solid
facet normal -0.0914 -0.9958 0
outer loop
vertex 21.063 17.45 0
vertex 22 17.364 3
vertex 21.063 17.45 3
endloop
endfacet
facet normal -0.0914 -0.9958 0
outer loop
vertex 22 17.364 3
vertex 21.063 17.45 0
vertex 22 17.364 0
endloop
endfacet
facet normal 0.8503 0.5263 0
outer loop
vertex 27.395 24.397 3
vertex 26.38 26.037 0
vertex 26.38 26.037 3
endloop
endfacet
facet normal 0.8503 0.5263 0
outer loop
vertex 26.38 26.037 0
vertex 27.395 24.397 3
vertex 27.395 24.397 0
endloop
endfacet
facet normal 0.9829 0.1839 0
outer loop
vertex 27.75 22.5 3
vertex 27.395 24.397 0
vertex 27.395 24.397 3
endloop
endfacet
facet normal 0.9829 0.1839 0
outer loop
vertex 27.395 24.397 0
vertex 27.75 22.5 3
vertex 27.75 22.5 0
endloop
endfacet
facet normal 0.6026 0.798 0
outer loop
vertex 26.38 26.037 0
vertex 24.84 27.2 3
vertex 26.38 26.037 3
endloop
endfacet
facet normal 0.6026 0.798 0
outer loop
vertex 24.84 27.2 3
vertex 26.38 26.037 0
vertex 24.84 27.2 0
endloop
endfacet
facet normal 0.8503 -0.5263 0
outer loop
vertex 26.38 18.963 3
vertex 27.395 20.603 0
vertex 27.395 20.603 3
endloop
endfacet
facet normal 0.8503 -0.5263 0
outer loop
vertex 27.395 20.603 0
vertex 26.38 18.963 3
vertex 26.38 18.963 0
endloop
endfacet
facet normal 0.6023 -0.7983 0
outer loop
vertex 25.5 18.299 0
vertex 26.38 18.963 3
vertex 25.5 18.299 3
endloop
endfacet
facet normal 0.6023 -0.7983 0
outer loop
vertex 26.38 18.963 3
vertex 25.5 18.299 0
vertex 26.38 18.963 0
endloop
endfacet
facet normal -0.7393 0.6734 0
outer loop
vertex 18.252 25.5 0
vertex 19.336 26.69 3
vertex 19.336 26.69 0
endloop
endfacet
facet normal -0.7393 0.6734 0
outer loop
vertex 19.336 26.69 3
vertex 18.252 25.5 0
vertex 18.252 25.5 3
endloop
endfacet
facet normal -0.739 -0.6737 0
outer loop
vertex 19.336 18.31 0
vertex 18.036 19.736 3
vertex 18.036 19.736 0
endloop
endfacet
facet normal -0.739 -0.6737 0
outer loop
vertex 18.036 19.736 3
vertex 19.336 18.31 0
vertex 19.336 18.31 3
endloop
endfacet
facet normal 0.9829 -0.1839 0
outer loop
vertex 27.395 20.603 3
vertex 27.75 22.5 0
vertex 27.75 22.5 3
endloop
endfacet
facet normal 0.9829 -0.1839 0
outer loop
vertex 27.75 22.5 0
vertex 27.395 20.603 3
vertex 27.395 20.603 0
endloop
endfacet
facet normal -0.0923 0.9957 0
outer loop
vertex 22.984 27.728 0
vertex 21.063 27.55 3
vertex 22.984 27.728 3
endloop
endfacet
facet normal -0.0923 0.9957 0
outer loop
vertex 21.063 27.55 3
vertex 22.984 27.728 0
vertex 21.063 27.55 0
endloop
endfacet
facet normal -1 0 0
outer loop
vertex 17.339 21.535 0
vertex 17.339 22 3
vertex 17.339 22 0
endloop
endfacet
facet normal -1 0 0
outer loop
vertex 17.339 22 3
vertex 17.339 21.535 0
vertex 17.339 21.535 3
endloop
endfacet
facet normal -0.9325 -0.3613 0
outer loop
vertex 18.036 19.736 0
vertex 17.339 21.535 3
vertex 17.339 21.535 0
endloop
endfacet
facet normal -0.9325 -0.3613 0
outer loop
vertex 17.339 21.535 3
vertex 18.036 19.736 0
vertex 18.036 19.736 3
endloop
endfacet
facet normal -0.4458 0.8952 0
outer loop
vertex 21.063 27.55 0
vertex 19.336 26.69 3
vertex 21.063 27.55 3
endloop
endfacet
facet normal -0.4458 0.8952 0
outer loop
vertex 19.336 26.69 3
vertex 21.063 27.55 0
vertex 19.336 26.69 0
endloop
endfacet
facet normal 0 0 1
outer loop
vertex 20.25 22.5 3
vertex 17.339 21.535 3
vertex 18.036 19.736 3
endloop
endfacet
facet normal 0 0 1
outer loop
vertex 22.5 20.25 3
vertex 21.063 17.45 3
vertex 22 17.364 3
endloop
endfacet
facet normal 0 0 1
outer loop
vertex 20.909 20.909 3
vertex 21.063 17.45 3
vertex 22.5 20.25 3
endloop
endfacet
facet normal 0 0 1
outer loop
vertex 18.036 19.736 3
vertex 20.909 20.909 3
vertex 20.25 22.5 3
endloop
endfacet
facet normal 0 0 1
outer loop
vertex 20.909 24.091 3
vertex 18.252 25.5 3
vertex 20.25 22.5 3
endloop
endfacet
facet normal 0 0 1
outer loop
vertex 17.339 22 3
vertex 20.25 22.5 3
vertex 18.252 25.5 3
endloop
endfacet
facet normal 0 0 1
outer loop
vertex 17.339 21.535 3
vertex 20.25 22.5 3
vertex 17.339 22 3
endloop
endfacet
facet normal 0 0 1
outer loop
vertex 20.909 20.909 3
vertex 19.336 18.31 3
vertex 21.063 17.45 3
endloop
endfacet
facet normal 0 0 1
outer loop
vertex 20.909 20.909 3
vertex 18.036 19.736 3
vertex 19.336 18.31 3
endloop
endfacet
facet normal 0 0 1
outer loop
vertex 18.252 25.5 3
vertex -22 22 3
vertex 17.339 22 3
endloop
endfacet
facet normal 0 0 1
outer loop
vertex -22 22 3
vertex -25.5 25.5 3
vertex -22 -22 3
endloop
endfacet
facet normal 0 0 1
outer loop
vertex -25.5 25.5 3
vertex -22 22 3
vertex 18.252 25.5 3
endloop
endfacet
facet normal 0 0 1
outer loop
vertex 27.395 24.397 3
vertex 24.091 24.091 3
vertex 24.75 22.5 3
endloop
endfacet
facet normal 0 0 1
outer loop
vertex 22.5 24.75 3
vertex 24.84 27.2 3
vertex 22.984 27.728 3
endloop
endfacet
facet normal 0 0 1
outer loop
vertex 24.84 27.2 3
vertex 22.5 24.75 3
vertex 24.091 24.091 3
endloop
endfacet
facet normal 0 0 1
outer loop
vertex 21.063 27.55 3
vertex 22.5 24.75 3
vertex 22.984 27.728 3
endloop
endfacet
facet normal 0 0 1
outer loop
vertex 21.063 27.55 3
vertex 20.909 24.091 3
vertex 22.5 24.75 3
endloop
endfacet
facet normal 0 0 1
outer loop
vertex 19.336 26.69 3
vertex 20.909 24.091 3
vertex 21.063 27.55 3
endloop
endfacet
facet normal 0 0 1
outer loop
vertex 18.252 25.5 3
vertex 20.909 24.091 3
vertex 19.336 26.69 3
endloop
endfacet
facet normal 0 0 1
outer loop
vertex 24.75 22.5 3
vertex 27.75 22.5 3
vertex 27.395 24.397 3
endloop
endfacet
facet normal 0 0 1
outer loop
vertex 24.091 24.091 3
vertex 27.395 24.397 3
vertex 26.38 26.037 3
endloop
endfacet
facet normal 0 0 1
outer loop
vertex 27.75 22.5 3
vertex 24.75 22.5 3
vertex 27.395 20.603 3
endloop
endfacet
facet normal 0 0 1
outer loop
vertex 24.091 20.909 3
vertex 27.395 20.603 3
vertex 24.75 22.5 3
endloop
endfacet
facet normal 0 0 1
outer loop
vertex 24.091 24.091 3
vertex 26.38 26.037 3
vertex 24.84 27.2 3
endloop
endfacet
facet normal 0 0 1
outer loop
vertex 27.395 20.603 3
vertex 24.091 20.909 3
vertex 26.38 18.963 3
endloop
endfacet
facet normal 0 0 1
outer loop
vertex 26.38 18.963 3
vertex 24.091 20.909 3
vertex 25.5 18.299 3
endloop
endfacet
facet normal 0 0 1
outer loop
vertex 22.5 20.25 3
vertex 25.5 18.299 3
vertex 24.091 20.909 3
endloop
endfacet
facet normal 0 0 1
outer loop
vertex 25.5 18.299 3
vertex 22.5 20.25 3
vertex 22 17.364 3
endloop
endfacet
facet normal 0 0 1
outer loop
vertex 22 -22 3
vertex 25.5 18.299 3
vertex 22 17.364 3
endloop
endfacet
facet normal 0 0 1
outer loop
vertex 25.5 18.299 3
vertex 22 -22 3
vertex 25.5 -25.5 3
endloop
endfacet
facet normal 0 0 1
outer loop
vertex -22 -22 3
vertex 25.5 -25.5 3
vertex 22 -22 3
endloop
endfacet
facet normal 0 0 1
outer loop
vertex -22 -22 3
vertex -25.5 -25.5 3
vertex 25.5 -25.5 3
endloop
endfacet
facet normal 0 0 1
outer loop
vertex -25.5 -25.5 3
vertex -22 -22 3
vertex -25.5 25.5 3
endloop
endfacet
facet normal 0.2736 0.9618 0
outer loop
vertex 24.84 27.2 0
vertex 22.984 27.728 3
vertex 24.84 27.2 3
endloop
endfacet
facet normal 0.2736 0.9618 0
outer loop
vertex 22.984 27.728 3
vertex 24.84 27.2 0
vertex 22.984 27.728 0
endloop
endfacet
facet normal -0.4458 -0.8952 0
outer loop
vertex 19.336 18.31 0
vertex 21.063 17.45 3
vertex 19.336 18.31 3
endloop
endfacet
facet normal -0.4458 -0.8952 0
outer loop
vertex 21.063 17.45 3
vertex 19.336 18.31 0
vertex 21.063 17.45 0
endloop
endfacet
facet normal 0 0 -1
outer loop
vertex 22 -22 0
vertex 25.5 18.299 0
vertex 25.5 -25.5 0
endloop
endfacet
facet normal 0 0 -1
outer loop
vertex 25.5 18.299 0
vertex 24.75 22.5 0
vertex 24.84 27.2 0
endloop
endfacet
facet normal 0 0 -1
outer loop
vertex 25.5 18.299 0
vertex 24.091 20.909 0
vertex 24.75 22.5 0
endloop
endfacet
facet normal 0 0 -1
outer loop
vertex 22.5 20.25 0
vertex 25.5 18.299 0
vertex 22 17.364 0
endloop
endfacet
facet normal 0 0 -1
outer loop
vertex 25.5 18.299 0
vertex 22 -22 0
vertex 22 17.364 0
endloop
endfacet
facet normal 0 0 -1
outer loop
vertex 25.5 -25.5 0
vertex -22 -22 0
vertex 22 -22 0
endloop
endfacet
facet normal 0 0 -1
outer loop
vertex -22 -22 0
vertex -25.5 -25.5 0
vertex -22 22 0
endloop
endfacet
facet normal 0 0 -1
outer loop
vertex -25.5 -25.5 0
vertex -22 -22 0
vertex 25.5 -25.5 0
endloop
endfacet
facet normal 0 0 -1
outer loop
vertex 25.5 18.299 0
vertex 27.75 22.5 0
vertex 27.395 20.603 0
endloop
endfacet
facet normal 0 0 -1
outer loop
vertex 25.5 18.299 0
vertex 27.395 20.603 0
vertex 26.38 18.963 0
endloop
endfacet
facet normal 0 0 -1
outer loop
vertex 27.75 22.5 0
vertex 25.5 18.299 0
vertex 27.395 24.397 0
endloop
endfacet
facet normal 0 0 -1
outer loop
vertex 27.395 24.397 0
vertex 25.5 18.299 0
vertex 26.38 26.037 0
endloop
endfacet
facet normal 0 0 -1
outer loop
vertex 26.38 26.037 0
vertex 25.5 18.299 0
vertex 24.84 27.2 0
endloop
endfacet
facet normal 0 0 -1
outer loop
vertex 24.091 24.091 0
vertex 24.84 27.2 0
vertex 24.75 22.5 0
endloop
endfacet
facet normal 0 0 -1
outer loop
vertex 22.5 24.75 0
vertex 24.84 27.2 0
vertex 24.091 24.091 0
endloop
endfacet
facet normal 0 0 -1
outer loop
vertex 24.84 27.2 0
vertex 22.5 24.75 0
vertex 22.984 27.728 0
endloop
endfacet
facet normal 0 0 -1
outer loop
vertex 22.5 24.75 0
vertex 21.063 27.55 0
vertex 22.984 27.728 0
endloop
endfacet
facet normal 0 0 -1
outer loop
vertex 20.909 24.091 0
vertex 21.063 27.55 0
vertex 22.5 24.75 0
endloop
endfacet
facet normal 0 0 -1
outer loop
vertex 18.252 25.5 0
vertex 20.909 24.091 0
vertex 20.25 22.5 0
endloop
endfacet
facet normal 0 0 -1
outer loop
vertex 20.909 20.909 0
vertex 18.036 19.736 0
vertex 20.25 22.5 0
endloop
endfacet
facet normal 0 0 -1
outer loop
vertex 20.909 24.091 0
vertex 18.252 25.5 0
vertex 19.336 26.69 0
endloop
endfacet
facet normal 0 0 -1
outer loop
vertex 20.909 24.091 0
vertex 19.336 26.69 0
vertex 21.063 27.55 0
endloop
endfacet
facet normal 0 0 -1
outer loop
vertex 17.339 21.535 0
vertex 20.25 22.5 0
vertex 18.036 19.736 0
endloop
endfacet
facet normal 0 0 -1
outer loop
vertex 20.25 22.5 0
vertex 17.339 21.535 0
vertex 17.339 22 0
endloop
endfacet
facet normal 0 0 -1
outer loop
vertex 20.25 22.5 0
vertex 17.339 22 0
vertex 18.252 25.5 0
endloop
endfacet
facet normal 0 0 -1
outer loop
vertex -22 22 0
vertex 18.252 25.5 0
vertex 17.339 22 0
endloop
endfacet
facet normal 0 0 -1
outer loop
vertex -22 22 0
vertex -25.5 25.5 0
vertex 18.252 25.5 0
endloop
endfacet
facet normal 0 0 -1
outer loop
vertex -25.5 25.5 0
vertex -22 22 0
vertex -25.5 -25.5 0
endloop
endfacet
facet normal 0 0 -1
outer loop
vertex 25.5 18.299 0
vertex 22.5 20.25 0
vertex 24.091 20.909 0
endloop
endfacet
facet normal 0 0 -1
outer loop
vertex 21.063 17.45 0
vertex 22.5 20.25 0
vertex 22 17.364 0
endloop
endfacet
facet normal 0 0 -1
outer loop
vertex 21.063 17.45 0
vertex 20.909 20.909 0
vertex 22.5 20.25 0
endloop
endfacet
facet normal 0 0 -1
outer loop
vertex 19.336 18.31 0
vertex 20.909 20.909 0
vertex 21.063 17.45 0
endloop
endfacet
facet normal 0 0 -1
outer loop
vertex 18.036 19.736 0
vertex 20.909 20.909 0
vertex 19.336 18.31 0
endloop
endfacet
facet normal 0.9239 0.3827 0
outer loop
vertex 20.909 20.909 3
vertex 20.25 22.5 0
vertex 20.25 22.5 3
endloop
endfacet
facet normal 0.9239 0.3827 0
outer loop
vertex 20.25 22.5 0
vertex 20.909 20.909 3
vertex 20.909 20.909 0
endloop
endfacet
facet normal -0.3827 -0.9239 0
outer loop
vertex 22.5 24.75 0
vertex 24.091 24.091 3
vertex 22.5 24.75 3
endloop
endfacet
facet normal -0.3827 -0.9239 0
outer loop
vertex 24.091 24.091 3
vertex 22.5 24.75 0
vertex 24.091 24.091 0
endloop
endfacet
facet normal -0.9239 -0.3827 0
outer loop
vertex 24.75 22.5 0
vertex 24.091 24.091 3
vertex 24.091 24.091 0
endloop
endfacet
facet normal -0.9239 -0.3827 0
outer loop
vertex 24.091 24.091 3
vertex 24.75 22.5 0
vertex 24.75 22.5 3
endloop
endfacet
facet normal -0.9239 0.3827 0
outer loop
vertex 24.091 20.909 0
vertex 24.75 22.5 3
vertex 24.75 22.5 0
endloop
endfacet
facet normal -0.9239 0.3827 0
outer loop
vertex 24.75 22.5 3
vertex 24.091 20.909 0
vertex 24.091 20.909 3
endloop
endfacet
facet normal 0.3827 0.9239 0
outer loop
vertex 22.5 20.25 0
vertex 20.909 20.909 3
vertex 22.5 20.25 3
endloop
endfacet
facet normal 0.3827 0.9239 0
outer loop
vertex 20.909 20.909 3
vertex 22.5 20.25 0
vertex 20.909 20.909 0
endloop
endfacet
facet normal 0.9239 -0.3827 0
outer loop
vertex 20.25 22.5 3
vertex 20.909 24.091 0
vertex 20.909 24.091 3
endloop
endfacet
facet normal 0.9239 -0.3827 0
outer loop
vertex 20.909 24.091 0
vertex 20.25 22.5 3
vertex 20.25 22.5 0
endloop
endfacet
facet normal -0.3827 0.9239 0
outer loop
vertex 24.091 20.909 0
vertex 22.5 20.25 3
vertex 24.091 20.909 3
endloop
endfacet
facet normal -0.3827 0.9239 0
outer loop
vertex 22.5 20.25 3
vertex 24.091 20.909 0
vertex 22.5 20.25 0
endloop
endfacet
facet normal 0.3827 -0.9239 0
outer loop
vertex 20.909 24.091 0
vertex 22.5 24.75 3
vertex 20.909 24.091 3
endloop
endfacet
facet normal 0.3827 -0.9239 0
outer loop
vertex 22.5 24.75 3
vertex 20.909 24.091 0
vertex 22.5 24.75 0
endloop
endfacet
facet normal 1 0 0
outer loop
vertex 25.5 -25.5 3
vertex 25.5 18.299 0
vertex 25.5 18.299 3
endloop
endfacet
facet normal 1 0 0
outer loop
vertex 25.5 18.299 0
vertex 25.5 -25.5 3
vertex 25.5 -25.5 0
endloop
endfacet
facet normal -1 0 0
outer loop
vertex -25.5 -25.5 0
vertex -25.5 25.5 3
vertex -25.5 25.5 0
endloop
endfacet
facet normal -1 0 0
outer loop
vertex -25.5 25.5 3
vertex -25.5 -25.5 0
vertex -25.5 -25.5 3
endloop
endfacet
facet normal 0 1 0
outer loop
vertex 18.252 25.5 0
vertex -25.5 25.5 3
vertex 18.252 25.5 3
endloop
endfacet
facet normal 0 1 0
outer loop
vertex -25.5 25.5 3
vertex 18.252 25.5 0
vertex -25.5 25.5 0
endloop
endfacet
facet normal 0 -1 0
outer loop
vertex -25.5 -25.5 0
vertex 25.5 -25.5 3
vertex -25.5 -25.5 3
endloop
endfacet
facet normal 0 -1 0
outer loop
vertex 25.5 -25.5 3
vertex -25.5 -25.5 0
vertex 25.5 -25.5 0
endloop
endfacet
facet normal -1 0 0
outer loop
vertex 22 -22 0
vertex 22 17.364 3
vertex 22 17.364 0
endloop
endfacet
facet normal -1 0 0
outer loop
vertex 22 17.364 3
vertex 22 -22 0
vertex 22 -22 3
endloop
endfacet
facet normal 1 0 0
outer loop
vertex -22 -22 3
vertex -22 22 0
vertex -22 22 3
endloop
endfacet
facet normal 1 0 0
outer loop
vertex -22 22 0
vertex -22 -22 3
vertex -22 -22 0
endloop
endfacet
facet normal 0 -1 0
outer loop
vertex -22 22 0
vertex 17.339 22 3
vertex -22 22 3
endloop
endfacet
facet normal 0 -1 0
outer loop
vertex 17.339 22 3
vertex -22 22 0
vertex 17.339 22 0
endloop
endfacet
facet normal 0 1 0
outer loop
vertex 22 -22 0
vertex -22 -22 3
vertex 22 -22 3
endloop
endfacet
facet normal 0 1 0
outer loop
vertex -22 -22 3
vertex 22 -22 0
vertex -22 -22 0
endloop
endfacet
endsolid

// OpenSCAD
//keychain-Customizable Lithopane by Mark G. Peeters 
//http://www.thingiverse.com/thing:308109
//version 1.3 
//if you are using openSCAD then you are cool! You can get DAT files for local use using this tool
//http://customizer.makerbot.com/image_surface
// i used the nice code for adjusting layers from here:
//http://www.thingiverse.com/thing:74322

// preview[view:south, tilt:top]
//
//
/* [Image] */

// Load a 100x100 pixel image.(images will be stretched to fit) Simple photos work best. Don't forget to click the Invert Colors checkbox! *** ALSO IF YOU HAVE LETTERS IN YOUR IMAGE make sure to reverse the image before uploading so the letters are not backwards.
image_file = "image-surface.dat"; // [image_surface:100x100]

/* [Adjustments] */

//shape NOTE: ALL units are in millimeters (mm)
shape = 1;//[0:circle, 1:square]
//over all size of the keychain. you picked
tag_size = 45;// [20:70]
// size for keyring 4.5 or 5 is good.
ring_hole=4.5;
// What layer height will you slice this at?  The thinner the better.
layer_height = 0.1;
//Use plastic color opacity to set this. The lower the layer height, the more layers you can use. you picked
number_of_layers = 20; // [5:30]
//Width of boarder lining the keychain (3mm is fine)
boarder_width = 3;//
//boarder thickness lining the keychain (at least 3mm for strength)
boarder_thick = 3;//

/* [Hidden] */

// base (white) will always be 2 layers thick
min_layer_height = layer_height*2;
height = layer_height*number_of_layers;
maxheight = height+min_layer_height;


// Make litho and trim bottom and sides
  difference() { //diff 1
  translate([0, 0, min_layer_height]) scale([(tag_size/100),(tag_size/100),height]) surface(file=image_file, center=true, convexity=5); //litosurface moved up min_layer_height
  translate([0,0,-(maxheight)]) linear_extrude(height=maxheight) square(tag_size, center=true);//cutting bottom off surface

if (shape==0) {//you picked circle shape------------------------------------
difference() {  //diff make tube to trim lith
                translate([0, 0, -7]) cylinder(maxheight+15,r= tag_size); //outside
                translate([0, 0, -9]) cylinder(maxheight+18,r= (tag_size/2)); //inside
               } //end diff make tube
translate([0, tag_size/2+boarder_width, -1])cylinder(maxheight+2,r= ring_hole/2); //ring hole
}//end if you picked circle------------------------------------------

if (shape==1) {//you picked square shape------------------------------------
difference() {  //diff make cube to trim litho
                translate([0, 0, -7]) cube(tag_size+15,center=true); //outside
               translate([0, 0, -9]) cube(tag_size,center=true); //inside
               } //end diff make tube
translate([tag_size/2, tag_size/2, -1])cylinder(maxheight+2,r= ring_hole/2); //ring hole
}//end if you picked square

}//end diff 1

//add boarder and loop
if (shape==0) {//you picked circle shape--------------------------
translate([0, tag_size/2+boarder_width, 0]) //move loop
difference(){//make loop
cylinder(boarder_thick,r=boarder_width+ring_hole/2); //ring support
translate([0, 0, -1])cylinder(boarder_thick+2,r= ring_hole/2); //ring hole
}

difference() {  //diff make frame tube
                 cylinder(boarder_thick,r= (tag_size/2)+boarder_width); //outside
                 cylinder(boarder_thick+1,r= (tag_size/2.02)); //inside
translate([0, tag_size/2+boarder_width, -1])cylinder(boarder_thick+2,r= ring_hole/2); //ring hole
                } //end diff make frame tube

}//end if you picked circle------------------------------------------

if (shape==1) {//you picked square shape------------------------------------
translate([tag_size/2, tag_size/2, 0]) //move loop
difference(){//make loop
cylinder(boarder_thick,r=boarder_width+ring_hole/2); //ring support
translate([0, 0, -1])cylinder(boarder_thick+2,r= ring_hole/2); //ring hole
}

difference() {  //diff make frame tube
                 translate([0,0,boarder_thick/2]) cube([tag_size+boarder_width*2,tag_size+boarder_width*2,boarder_thick],center=true); //outside
                 translate([0,0,boarder_thick/2]) cube([tag_size-1,tag_size-1,boarder_thick+1],center=true); //inside
translate([tag_size/2, tag_size/2, -1])cylinder(boarder_thick+2,r= ring_hole/2); //ring hole                
                        } //end diff make frame tube
}//end if you picked square------------------------------------------------





